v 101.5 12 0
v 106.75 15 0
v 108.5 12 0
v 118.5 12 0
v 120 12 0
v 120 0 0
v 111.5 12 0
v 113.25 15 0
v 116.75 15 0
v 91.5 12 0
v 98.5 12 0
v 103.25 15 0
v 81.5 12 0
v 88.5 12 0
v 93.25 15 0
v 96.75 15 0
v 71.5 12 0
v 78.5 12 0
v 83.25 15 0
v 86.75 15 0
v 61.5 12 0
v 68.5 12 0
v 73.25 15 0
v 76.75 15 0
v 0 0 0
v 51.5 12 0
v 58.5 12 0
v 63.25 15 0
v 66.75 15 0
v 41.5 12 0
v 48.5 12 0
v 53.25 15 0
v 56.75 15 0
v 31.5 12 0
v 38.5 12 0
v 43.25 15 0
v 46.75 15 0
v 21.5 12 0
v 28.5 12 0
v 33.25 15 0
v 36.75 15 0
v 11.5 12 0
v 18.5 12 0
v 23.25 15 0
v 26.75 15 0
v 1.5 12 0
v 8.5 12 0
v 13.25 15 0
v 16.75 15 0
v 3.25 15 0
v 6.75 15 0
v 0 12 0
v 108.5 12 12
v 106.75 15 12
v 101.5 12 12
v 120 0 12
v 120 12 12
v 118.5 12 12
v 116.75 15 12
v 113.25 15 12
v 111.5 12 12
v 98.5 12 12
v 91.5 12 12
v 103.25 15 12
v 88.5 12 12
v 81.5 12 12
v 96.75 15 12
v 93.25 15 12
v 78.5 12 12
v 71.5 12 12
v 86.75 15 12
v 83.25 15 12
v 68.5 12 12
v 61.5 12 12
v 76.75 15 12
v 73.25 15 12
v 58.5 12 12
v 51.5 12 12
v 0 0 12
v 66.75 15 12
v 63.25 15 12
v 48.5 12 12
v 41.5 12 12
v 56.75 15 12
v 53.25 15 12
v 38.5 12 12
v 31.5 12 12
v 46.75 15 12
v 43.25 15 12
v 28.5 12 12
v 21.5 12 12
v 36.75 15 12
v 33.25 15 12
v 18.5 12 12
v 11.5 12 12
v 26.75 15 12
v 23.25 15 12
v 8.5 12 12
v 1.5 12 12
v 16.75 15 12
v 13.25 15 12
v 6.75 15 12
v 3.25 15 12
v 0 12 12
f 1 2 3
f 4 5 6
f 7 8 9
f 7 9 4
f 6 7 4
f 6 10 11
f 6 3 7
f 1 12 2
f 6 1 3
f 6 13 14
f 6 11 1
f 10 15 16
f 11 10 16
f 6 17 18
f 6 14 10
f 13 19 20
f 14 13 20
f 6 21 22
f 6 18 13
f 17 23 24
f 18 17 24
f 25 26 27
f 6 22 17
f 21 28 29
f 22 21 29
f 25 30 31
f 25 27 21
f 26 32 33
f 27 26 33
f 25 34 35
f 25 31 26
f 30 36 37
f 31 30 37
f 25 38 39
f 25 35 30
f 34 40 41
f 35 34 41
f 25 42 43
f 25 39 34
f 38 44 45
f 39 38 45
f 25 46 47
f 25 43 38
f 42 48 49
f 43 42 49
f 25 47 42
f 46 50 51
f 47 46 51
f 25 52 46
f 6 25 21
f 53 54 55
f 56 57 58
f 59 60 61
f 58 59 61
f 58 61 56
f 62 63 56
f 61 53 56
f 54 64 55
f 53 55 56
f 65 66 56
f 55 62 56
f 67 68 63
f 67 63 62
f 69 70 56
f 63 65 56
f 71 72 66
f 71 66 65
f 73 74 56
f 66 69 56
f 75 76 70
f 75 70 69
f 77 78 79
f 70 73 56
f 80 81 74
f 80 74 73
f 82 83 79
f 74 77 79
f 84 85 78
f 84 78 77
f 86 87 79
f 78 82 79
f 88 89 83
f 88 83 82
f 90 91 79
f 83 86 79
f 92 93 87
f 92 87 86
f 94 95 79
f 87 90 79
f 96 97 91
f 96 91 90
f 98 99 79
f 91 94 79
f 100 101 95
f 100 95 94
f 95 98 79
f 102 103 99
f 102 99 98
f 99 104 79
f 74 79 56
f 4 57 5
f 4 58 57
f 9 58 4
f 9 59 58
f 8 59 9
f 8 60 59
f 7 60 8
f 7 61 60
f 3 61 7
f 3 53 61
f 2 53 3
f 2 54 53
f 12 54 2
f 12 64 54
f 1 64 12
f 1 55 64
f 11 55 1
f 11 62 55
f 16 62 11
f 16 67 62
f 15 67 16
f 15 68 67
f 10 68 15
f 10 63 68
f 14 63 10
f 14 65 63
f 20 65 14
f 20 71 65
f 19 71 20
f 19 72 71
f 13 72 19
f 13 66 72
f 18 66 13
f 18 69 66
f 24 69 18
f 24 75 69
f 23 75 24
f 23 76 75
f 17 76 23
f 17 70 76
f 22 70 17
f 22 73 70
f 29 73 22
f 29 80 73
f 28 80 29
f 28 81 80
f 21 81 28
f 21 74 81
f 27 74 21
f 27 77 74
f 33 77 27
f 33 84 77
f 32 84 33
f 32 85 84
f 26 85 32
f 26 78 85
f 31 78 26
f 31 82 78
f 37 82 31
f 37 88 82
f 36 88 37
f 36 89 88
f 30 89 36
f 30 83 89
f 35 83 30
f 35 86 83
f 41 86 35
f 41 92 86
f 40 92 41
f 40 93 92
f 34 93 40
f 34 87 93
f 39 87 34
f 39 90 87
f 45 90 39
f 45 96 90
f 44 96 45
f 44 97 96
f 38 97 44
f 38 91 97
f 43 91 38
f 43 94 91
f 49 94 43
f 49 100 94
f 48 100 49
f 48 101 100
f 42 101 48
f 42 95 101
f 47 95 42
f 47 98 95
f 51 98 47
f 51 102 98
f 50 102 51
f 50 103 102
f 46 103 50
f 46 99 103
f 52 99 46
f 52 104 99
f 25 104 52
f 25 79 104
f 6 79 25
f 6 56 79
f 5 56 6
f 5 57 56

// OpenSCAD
$fn = 32;

// ----------------------------------------------------------------------
// Gear rack: 12 teeth, pitch 10 mm
// ----------------------------------------------------------------------

// --- parameters (mm) ---
teeth = 12;               // number of teeth
pitch = 10;               // tooth pitch, X
root_w = 7;               // tooth width at the root
tip_w = 3.5;              // tooth width at the tip
base_h = 12;              // rack body height, Y
tooth_h = 3;              // tooth height above the body
plate_t = 12;             // rack width, Z (extrusion height)

rack_l = teeth * pitch;  // overall length
total_h = base_h + tooth_h;  // overall height

profile = [[0, 0], [120, 0], [120, 12], [118.5, 12], [116.75, 15], [113.25, 15], [111.5, 12], [108.5, 12], [106.75, 15], [103.25, 15], [101.5, 12], [98.5, 12], [96.75, 15], [93.25, 15], [91.5, 12], [88.5, 12], [86.75, 15], [83.25, 15], [81.5, 12], [78.5, 12], [76.75, 15], [73.25, 15], [71.5, 12], [68.5, 12], [66.75, 15], [63.25, 15], [61.5, 12], [58.5, 12], [56.75, 15], [53.25, 15], [51.5, 12], [48.5, 12], [46.75, 15], [43.25, 15], [41.5, 12], [38.5, 12], [36.75, 15], [33.25, 15], [31.5, 12], [28.5, 12], [26.75, 15], [23.25, 15], [21.5, 12], [18.5, 12], [16.75, 15], [13.25, 15], [11.5, 12], [8.5, 12], [6.75, 15], [3.25, 15], [1.5, 12], [0, 12]];  // primary outline, 52 points, counter clockwise

// --- the one profile operation ---
linear_extrude(height = plate_t) polygon(points = profile);
